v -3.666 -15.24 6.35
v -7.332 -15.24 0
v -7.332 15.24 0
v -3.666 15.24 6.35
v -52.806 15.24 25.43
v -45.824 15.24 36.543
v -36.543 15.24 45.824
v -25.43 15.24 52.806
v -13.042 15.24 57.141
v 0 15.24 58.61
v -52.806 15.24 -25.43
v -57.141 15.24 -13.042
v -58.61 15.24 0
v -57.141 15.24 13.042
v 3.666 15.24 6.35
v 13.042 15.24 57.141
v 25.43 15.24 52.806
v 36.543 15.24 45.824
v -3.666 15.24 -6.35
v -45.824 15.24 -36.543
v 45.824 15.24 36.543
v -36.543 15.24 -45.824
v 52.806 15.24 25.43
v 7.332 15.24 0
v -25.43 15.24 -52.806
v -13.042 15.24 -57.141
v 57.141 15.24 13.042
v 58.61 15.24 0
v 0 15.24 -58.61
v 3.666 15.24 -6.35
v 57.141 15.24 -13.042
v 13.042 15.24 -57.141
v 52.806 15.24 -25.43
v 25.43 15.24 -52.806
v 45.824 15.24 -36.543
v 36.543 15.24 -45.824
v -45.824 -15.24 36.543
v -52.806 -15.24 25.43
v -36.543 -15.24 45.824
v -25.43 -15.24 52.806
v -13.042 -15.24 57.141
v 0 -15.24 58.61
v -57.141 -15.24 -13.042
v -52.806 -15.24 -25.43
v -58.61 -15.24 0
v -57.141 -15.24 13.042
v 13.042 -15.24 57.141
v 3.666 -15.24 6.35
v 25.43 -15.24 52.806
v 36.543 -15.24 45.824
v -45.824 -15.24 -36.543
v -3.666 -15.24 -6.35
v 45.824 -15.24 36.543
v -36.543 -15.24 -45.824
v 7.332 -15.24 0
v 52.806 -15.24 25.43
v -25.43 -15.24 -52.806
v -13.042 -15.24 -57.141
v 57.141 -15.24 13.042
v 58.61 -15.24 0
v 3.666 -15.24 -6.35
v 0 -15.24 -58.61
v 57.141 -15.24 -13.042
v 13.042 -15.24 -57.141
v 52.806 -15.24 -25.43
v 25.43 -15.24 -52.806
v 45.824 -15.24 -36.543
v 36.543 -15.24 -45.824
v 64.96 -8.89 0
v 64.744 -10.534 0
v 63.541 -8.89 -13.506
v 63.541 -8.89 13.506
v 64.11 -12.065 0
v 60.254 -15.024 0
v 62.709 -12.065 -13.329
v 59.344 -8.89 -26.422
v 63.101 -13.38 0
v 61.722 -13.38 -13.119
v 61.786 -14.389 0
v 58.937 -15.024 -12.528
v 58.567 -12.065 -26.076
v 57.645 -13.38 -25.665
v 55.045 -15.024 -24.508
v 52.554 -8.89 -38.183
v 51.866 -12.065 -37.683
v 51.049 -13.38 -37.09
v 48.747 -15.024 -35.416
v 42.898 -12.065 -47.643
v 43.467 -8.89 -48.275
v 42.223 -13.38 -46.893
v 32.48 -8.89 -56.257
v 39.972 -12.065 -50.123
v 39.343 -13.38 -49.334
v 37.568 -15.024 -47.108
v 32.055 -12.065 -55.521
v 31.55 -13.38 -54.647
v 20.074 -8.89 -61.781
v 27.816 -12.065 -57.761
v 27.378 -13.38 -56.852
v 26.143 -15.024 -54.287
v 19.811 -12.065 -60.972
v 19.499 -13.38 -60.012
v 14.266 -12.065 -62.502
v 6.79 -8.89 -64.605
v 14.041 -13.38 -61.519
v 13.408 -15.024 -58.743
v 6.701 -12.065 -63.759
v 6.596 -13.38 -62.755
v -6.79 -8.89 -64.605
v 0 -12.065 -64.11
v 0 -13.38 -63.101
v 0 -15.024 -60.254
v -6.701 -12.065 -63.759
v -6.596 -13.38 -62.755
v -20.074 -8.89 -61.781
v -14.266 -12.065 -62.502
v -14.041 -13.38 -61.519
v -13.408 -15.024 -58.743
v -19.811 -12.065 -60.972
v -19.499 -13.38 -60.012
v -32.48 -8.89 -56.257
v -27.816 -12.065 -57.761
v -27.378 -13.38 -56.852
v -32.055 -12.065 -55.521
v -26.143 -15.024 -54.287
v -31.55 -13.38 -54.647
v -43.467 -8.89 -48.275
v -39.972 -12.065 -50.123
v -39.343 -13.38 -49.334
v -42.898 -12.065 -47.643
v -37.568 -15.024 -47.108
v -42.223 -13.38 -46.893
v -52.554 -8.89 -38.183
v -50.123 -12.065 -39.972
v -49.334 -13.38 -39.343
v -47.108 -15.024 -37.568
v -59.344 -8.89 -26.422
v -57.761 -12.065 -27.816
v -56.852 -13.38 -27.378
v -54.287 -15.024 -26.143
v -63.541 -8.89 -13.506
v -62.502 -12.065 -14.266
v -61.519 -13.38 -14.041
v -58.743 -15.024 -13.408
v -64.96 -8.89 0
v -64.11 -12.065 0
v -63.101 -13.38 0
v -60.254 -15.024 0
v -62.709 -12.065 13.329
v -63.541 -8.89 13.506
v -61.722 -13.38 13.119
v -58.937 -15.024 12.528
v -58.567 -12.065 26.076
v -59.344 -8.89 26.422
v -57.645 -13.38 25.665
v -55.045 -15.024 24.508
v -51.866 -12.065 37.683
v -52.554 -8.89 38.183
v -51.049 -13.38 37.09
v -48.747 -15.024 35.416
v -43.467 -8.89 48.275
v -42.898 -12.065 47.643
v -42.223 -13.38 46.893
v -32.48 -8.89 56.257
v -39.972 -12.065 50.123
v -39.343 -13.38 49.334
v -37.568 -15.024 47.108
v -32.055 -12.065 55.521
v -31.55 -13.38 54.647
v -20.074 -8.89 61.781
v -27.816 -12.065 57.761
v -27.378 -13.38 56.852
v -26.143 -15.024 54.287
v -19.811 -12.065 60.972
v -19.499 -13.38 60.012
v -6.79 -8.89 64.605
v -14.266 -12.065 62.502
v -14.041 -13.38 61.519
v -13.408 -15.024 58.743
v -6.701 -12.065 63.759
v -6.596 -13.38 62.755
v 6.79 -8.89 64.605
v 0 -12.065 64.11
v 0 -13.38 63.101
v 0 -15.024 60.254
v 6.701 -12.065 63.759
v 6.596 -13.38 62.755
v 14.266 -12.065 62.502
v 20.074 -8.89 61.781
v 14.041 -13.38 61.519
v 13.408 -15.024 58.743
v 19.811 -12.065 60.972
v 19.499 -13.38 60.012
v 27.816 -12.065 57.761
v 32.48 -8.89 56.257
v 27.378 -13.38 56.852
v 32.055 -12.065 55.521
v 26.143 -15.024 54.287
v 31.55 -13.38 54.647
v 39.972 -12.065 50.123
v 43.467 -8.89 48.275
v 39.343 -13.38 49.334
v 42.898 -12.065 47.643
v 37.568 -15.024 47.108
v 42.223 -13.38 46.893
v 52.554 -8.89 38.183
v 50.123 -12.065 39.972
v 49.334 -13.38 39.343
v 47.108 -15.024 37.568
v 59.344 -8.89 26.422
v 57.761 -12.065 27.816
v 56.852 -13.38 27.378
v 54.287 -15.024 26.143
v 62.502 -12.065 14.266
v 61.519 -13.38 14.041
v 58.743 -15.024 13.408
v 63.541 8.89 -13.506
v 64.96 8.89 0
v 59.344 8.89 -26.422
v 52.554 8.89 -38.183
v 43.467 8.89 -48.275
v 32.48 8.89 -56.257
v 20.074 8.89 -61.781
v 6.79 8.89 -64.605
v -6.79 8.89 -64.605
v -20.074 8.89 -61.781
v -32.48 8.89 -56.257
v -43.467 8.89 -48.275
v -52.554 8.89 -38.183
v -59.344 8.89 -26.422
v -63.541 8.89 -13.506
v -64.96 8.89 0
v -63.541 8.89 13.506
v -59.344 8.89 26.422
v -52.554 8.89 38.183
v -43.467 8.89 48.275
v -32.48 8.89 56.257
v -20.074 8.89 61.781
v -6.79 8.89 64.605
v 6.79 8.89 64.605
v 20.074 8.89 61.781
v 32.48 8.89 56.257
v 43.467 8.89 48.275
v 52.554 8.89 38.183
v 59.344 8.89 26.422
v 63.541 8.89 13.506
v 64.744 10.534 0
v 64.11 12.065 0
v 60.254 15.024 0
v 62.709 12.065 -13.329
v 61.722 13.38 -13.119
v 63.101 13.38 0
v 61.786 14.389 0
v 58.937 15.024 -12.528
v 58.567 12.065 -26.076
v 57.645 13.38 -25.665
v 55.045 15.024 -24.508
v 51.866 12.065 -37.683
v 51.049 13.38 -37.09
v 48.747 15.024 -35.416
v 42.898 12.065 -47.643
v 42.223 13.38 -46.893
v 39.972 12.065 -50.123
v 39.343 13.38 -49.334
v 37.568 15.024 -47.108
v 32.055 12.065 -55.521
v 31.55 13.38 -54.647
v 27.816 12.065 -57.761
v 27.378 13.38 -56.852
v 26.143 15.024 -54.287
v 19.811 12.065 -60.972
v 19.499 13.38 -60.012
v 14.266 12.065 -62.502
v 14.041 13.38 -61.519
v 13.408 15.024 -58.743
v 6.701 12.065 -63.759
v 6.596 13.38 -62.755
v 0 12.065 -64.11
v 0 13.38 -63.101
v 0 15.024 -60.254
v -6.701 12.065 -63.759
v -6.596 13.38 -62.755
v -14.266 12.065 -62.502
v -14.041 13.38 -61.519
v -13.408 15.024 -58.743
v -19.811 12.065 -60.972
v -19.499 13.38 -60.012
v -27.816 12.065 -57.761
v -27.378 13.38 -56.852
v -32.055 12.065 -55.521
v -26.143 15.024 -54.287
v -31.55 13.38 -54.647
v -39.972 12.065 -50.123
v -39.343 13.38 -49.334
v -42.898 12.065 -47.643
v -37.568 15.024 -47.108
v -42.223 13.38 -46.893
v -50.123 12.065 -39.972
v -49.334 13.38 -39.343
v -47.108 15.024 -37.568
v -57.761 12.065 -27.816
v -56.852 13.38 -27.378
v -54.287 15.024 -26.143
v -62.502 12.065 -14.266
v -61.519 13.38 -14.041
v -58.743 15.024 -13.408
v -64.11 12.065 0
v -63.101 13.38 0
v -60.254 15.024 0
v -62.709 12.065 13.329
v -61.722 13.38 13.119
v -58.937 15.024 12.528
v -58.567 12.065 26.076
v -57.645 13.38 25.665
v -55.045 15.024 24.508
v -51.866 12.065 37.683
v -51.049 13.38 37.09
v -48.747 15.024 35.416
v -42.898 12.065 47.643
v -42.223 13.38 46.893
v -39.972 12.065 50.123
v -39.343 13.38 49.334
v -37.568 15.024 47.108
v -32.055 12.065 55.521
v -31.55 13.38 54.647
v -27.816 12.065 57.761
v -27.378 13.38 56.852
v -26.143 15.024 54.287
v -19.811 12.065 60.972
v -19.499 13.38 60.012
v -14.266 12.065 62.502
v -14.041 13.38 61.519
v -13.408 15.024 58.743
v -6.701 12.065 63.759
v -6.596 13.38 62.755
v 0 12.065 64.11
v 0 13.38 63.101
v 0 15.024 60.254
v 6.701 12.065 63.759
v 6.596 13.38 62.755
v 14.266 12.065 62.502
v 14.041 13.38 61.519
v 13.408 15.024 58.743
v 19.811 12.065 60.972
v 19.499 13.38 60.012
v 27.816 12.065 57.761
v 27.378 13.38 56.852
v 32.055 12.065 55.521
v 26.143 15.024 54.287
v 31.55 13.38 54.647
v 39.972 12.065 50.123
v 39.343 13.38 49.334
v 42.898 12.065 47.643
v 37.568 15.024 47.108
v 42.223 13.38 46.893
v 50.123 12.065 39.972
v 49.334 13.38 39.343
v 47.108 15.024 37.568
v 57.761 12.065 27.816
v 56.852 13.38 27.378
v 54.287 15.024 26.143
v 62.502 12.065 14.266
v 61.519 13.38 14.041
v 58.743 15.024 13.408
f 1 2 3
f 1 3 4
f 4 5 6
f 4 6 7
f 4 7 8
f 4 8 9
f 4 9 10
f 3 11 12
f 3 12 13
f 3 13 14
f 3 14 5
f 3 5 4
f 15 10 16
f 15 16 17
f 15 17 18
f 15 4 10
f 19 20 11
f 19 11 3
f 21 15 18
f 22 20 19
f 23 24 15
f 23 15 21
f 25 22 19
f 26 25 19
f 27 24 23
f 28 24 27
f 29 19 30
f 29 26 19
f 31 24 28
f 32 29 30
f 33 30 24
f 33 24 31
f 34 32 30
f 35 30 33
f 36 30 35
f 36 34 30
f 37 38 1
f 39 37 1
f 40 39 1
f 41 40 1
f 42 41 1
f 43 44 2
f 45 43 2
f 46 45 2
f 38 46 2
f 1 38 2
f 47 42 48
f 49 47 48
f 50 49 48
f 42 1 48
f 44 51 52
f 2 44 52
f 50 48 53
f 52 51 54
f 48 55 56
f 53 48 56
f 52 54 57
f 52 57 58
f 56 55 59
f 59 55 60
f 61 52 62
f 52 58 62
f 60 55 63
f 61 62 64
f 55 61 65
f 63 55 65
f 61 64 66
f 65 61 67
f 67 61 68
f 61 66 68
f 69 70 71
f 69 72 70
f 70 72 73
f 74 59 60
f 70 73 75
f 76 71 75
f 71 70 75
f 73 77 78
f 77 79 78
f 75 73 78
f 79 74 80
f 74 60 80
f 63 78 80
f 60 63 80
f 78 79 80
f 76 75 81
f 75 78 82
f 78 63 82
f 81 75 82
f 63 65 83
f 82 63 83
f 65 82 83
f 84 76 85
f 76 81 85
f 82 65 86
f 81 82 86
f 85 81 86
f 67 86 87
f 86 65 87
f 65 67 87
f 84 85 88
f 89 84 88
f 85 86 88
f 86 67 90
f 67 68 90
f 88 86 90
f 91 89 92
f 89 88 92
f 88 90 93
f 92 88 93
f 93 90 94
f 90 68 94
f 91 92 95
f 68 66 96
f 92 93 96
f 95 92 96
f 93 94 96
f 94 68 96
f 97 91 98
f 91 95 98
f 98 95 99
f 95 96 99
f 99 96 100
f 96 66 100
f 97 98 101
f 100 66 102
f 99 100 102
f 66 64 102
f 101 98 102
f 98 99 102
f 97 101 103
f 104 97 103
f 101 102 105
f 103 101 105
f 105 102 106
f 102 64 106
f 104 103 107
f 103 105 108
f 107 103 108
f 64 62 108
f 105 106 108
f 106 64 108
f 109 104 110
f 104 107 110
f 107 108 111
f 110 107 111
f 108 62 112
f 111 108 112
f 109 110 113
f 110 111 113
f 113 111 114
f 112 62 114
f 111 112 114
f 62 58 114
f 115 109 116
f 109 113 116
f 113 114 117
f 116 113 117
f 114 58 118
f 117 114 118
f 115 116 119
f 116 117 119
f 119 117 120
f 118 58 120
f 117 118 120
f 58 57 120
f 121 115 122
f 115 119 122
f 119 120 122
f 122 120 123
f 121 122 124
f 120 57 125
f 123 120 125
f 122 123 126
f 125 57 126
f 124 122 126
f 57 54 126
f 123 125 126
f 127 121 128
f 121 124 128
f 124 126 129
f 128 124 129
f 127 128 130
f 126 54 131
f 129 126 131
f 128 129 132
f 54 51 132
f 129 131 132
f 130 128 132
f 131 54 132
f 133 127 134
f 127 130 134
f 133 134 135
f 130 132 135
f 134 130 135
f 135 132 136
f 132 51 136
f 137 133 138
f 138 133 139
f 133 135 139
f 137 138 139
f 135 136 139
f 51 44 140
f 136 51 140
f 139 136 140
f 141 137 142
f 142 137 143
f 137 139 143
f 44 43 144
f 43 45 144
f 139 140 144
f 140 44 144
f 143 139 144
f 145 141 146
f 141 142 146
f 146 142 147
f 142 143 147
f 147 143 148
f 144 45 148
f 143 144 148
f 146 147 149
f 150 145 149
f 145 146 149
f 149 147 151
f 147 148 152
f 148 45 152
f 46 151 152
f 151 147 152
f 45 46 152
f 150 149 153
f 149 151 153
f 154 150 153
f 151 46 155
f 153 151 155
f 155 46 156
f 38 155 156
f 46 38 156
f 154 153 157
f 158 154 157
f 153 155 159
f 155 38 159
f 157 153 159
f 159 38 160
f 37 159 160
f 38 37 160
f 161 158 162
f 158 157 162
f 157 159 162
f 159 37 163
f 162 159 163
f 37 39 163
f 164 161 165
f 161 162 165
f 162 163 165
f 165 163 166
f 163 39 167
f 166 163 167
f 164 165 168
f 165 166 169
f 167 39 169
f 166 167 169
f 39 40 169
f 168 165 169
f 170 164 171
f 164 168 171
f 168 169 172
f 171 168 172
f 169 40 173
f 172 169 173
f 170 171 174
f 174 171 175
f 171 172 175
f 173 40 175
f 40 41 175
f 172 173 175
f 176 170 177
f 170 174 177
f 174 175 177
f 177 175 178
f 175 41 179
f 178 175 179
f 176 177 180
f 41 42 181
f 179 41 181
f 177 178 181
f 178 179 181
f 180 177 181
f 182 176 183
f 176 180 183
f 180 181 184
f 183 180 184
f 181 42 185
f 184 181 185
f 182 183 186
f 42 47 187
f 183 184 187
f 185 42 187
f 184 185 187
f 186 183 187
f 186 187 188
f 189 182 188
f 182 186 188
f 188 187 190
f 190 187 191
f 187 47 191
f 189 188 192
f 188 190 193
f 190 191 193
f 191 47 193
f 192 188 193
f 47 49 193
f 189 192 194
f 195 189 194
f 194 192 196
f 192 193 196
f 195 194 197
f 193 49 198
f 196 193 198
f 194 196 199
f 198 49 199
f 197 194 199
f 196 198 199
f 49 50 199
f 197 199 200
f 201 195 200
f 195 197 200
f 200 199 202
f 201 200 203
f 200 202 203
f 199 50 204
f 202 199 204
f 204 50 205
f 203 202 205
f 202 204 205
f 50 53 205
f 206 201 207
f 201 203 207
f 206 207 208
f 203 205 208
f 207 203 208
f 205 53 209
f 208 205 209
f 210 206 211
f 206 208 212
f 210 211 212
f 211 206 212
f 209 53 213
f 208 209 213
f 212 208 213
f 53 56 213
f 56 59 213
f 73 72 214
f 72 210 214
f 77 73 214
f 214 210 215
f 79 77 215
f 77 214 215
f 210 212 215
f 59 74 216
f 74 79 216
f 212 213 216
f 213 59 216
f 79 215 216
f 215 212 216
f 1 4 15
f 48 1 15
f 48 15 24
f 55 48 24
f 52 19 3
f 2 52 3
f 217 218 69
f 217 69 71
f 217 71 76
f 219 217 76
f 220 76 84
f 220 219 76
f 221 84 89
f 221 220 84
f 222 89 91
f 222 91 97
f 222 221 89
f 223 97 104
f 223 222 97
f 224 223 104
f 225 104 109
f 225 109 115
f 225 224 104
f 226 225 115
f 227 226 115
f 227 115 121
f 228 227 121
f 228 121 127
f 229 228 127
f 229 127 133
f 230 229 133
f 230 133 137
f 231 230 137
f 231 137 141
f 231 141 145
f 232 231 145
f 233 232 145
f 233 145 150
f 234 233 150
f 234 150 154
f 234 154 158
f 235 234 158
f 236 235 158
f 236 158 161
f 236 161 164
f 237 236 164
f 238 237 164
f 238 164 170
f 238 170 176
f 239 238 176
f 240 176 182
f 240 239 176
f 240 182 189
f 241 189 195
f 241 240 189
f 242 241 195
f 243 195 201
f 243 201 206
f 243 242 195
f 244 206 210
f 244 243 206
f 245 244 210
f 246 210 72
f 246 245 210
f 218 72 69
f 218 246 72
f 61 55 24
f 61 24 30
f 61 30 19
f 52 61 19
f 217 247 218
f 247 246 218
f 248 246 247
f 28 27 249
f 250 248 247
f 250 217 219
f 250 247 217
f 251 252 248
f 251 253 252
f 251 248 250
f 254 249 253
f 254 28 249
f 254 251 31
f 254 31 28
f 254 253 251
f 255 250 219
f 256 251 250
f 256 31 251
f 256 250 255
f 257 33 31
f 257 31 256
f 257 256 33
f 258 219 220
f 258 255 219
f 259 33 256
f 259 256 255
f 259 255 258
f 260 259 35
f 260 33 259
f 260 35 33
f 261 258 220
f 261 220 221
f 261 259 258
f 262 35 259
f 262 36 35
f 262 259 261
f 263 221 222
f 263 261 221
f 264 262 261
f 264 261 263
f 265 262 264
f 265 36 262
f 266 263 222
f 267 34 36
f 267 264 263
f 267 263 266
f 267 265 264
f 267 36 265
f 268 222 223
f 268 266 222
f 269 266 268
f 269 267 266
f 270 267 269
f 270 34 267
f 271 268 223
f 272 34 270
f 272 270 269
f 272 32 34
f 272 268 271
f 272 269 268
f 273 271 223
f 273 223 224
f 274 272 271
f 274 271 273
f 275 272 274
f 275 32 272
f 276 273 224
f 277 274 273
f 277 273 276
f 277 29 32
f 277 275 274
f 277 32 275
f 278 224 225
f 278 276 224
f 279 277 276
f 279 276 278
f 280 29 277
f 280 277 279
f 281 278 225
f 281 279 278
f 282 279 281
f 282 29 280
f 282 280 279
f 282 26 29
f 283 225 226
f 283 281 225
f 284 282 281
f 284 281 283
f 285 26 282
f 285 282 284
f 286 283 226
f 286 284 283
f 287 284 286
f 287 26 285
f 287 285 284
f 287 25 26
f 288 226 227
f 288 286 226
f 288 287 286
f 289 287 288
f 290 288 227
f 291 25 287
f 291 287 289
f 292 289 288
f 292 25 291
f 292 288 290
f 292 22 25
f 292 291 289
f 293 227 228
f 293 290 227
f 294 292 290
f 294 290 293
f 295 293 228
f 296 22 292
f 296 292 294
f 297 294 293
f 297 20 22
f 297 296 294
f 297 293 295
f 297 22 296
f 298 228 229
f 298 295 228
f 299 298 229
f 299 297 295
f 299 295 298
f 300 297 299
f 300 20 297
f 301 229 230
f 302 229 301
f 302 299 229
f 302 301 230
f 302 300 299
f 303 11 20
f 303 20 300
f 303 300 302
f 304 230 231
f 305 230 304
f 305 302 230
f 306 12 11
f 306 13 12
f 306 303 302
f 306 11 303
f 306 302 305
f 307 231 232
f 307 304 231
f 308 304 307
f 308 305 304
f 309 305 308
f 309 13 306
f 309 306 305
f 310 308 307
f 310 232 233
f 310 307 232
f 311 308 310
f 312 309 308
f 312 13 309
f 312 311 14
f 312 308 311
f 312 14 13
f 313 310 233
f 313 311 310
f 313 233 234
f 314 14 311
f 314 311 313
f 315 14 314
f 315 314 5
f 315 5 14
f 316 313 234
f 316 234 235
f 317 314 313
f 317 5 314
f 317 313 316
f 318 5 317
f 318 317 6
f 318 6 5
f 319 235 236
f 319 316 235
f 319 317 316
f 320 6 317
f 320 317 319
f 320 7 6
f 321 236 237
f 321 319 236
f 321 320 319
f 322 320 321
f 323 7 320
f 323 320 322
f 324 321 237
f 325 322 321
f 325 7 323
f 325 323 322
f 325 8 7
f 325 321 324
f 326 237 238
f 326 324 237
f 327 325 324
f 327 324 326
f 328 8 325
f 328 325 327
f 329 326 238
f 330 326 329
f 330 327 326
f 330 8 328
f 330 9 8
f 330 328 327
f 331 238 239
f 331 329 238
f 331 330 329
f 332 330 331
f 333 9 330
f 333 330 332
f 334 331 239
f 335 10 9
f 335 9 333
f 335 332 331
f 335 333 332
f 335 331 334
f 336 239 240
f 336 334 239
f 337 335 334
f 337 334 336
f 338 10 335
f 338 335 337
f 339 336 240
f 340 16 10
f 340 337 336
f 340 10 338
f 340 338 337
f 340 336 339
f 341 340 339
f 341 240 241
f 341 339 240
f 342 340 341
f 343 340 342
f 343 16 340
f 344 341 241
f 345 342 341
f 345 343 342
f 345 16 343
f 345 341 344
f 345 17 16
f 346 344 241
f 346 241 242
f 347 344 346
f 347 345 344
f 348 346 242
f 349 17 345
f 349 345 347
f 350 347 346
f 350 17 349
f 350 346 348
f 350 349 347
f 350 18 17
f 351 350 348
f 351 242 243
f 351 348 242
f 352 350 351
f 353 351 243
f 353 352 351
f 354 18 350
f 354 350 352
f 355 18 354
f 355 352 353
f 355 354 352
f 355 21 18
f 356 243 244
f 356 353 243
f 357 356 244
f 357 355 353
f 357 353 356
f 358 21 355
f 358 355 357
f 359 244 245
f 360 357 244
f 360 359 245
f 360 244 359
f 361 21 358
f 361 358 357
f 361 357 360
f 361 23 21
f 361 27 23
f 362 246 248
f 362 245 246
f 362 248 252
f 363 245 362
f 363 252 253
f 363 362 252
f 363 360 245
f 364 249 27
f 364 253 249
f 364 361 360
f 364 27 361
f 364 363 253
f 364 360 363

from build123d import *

# Parameters (mm, degrees)
SKETCH1_R           = 64.9605
BOSS_EXTRUDE1_DEPTH = 15.24
CUT_EXTRUDE1_DEPTH  = 30.48
FILLET1_R           = 6.35


with BuildPart() as part:
    # Sketch1 → Boss-Extrude1 (new, symmetric)
    with BuildSketch(Plane(origin=(0, 0, 0), x_dir=(1, 0, 0), z_dir=(0, 1, 0))):
        Circle(SKETCH1_R)
    extrude(amount=BOSS_EXTRUDE1_DEPTH, both=True)

    # Sketch2 → Cut-Extrude1 (cut)
    with BuildSketch(Plane(origin=(0, 15.24, 0), x_dir=(1, 0, 0), z_dir=(0, 1, 0))):
        Polygon((7.332348419, 8.887e-06), (3.666166513, 6.350004444), (-3.666181906, 6.349995556), (-7.332348419, -8.887e-06), (-3.666166513, -6.350004444), (3.666181906, -6.349995556), align=None)
    extrude(amount=-CUT_EXTRUDE1_DEPTH, mode=Mode.SUBTRACT)

    # Fillet1
    fillet1_edges = [part.edges().sort_by_distance(p)[0] for p in [
        (-64.9605, -15.24, 0),
        (-64.9605, 15.24, 0),
    ]]
    fillet(fillet1_edges, radius=FILLET1_R)


solid = part.part
